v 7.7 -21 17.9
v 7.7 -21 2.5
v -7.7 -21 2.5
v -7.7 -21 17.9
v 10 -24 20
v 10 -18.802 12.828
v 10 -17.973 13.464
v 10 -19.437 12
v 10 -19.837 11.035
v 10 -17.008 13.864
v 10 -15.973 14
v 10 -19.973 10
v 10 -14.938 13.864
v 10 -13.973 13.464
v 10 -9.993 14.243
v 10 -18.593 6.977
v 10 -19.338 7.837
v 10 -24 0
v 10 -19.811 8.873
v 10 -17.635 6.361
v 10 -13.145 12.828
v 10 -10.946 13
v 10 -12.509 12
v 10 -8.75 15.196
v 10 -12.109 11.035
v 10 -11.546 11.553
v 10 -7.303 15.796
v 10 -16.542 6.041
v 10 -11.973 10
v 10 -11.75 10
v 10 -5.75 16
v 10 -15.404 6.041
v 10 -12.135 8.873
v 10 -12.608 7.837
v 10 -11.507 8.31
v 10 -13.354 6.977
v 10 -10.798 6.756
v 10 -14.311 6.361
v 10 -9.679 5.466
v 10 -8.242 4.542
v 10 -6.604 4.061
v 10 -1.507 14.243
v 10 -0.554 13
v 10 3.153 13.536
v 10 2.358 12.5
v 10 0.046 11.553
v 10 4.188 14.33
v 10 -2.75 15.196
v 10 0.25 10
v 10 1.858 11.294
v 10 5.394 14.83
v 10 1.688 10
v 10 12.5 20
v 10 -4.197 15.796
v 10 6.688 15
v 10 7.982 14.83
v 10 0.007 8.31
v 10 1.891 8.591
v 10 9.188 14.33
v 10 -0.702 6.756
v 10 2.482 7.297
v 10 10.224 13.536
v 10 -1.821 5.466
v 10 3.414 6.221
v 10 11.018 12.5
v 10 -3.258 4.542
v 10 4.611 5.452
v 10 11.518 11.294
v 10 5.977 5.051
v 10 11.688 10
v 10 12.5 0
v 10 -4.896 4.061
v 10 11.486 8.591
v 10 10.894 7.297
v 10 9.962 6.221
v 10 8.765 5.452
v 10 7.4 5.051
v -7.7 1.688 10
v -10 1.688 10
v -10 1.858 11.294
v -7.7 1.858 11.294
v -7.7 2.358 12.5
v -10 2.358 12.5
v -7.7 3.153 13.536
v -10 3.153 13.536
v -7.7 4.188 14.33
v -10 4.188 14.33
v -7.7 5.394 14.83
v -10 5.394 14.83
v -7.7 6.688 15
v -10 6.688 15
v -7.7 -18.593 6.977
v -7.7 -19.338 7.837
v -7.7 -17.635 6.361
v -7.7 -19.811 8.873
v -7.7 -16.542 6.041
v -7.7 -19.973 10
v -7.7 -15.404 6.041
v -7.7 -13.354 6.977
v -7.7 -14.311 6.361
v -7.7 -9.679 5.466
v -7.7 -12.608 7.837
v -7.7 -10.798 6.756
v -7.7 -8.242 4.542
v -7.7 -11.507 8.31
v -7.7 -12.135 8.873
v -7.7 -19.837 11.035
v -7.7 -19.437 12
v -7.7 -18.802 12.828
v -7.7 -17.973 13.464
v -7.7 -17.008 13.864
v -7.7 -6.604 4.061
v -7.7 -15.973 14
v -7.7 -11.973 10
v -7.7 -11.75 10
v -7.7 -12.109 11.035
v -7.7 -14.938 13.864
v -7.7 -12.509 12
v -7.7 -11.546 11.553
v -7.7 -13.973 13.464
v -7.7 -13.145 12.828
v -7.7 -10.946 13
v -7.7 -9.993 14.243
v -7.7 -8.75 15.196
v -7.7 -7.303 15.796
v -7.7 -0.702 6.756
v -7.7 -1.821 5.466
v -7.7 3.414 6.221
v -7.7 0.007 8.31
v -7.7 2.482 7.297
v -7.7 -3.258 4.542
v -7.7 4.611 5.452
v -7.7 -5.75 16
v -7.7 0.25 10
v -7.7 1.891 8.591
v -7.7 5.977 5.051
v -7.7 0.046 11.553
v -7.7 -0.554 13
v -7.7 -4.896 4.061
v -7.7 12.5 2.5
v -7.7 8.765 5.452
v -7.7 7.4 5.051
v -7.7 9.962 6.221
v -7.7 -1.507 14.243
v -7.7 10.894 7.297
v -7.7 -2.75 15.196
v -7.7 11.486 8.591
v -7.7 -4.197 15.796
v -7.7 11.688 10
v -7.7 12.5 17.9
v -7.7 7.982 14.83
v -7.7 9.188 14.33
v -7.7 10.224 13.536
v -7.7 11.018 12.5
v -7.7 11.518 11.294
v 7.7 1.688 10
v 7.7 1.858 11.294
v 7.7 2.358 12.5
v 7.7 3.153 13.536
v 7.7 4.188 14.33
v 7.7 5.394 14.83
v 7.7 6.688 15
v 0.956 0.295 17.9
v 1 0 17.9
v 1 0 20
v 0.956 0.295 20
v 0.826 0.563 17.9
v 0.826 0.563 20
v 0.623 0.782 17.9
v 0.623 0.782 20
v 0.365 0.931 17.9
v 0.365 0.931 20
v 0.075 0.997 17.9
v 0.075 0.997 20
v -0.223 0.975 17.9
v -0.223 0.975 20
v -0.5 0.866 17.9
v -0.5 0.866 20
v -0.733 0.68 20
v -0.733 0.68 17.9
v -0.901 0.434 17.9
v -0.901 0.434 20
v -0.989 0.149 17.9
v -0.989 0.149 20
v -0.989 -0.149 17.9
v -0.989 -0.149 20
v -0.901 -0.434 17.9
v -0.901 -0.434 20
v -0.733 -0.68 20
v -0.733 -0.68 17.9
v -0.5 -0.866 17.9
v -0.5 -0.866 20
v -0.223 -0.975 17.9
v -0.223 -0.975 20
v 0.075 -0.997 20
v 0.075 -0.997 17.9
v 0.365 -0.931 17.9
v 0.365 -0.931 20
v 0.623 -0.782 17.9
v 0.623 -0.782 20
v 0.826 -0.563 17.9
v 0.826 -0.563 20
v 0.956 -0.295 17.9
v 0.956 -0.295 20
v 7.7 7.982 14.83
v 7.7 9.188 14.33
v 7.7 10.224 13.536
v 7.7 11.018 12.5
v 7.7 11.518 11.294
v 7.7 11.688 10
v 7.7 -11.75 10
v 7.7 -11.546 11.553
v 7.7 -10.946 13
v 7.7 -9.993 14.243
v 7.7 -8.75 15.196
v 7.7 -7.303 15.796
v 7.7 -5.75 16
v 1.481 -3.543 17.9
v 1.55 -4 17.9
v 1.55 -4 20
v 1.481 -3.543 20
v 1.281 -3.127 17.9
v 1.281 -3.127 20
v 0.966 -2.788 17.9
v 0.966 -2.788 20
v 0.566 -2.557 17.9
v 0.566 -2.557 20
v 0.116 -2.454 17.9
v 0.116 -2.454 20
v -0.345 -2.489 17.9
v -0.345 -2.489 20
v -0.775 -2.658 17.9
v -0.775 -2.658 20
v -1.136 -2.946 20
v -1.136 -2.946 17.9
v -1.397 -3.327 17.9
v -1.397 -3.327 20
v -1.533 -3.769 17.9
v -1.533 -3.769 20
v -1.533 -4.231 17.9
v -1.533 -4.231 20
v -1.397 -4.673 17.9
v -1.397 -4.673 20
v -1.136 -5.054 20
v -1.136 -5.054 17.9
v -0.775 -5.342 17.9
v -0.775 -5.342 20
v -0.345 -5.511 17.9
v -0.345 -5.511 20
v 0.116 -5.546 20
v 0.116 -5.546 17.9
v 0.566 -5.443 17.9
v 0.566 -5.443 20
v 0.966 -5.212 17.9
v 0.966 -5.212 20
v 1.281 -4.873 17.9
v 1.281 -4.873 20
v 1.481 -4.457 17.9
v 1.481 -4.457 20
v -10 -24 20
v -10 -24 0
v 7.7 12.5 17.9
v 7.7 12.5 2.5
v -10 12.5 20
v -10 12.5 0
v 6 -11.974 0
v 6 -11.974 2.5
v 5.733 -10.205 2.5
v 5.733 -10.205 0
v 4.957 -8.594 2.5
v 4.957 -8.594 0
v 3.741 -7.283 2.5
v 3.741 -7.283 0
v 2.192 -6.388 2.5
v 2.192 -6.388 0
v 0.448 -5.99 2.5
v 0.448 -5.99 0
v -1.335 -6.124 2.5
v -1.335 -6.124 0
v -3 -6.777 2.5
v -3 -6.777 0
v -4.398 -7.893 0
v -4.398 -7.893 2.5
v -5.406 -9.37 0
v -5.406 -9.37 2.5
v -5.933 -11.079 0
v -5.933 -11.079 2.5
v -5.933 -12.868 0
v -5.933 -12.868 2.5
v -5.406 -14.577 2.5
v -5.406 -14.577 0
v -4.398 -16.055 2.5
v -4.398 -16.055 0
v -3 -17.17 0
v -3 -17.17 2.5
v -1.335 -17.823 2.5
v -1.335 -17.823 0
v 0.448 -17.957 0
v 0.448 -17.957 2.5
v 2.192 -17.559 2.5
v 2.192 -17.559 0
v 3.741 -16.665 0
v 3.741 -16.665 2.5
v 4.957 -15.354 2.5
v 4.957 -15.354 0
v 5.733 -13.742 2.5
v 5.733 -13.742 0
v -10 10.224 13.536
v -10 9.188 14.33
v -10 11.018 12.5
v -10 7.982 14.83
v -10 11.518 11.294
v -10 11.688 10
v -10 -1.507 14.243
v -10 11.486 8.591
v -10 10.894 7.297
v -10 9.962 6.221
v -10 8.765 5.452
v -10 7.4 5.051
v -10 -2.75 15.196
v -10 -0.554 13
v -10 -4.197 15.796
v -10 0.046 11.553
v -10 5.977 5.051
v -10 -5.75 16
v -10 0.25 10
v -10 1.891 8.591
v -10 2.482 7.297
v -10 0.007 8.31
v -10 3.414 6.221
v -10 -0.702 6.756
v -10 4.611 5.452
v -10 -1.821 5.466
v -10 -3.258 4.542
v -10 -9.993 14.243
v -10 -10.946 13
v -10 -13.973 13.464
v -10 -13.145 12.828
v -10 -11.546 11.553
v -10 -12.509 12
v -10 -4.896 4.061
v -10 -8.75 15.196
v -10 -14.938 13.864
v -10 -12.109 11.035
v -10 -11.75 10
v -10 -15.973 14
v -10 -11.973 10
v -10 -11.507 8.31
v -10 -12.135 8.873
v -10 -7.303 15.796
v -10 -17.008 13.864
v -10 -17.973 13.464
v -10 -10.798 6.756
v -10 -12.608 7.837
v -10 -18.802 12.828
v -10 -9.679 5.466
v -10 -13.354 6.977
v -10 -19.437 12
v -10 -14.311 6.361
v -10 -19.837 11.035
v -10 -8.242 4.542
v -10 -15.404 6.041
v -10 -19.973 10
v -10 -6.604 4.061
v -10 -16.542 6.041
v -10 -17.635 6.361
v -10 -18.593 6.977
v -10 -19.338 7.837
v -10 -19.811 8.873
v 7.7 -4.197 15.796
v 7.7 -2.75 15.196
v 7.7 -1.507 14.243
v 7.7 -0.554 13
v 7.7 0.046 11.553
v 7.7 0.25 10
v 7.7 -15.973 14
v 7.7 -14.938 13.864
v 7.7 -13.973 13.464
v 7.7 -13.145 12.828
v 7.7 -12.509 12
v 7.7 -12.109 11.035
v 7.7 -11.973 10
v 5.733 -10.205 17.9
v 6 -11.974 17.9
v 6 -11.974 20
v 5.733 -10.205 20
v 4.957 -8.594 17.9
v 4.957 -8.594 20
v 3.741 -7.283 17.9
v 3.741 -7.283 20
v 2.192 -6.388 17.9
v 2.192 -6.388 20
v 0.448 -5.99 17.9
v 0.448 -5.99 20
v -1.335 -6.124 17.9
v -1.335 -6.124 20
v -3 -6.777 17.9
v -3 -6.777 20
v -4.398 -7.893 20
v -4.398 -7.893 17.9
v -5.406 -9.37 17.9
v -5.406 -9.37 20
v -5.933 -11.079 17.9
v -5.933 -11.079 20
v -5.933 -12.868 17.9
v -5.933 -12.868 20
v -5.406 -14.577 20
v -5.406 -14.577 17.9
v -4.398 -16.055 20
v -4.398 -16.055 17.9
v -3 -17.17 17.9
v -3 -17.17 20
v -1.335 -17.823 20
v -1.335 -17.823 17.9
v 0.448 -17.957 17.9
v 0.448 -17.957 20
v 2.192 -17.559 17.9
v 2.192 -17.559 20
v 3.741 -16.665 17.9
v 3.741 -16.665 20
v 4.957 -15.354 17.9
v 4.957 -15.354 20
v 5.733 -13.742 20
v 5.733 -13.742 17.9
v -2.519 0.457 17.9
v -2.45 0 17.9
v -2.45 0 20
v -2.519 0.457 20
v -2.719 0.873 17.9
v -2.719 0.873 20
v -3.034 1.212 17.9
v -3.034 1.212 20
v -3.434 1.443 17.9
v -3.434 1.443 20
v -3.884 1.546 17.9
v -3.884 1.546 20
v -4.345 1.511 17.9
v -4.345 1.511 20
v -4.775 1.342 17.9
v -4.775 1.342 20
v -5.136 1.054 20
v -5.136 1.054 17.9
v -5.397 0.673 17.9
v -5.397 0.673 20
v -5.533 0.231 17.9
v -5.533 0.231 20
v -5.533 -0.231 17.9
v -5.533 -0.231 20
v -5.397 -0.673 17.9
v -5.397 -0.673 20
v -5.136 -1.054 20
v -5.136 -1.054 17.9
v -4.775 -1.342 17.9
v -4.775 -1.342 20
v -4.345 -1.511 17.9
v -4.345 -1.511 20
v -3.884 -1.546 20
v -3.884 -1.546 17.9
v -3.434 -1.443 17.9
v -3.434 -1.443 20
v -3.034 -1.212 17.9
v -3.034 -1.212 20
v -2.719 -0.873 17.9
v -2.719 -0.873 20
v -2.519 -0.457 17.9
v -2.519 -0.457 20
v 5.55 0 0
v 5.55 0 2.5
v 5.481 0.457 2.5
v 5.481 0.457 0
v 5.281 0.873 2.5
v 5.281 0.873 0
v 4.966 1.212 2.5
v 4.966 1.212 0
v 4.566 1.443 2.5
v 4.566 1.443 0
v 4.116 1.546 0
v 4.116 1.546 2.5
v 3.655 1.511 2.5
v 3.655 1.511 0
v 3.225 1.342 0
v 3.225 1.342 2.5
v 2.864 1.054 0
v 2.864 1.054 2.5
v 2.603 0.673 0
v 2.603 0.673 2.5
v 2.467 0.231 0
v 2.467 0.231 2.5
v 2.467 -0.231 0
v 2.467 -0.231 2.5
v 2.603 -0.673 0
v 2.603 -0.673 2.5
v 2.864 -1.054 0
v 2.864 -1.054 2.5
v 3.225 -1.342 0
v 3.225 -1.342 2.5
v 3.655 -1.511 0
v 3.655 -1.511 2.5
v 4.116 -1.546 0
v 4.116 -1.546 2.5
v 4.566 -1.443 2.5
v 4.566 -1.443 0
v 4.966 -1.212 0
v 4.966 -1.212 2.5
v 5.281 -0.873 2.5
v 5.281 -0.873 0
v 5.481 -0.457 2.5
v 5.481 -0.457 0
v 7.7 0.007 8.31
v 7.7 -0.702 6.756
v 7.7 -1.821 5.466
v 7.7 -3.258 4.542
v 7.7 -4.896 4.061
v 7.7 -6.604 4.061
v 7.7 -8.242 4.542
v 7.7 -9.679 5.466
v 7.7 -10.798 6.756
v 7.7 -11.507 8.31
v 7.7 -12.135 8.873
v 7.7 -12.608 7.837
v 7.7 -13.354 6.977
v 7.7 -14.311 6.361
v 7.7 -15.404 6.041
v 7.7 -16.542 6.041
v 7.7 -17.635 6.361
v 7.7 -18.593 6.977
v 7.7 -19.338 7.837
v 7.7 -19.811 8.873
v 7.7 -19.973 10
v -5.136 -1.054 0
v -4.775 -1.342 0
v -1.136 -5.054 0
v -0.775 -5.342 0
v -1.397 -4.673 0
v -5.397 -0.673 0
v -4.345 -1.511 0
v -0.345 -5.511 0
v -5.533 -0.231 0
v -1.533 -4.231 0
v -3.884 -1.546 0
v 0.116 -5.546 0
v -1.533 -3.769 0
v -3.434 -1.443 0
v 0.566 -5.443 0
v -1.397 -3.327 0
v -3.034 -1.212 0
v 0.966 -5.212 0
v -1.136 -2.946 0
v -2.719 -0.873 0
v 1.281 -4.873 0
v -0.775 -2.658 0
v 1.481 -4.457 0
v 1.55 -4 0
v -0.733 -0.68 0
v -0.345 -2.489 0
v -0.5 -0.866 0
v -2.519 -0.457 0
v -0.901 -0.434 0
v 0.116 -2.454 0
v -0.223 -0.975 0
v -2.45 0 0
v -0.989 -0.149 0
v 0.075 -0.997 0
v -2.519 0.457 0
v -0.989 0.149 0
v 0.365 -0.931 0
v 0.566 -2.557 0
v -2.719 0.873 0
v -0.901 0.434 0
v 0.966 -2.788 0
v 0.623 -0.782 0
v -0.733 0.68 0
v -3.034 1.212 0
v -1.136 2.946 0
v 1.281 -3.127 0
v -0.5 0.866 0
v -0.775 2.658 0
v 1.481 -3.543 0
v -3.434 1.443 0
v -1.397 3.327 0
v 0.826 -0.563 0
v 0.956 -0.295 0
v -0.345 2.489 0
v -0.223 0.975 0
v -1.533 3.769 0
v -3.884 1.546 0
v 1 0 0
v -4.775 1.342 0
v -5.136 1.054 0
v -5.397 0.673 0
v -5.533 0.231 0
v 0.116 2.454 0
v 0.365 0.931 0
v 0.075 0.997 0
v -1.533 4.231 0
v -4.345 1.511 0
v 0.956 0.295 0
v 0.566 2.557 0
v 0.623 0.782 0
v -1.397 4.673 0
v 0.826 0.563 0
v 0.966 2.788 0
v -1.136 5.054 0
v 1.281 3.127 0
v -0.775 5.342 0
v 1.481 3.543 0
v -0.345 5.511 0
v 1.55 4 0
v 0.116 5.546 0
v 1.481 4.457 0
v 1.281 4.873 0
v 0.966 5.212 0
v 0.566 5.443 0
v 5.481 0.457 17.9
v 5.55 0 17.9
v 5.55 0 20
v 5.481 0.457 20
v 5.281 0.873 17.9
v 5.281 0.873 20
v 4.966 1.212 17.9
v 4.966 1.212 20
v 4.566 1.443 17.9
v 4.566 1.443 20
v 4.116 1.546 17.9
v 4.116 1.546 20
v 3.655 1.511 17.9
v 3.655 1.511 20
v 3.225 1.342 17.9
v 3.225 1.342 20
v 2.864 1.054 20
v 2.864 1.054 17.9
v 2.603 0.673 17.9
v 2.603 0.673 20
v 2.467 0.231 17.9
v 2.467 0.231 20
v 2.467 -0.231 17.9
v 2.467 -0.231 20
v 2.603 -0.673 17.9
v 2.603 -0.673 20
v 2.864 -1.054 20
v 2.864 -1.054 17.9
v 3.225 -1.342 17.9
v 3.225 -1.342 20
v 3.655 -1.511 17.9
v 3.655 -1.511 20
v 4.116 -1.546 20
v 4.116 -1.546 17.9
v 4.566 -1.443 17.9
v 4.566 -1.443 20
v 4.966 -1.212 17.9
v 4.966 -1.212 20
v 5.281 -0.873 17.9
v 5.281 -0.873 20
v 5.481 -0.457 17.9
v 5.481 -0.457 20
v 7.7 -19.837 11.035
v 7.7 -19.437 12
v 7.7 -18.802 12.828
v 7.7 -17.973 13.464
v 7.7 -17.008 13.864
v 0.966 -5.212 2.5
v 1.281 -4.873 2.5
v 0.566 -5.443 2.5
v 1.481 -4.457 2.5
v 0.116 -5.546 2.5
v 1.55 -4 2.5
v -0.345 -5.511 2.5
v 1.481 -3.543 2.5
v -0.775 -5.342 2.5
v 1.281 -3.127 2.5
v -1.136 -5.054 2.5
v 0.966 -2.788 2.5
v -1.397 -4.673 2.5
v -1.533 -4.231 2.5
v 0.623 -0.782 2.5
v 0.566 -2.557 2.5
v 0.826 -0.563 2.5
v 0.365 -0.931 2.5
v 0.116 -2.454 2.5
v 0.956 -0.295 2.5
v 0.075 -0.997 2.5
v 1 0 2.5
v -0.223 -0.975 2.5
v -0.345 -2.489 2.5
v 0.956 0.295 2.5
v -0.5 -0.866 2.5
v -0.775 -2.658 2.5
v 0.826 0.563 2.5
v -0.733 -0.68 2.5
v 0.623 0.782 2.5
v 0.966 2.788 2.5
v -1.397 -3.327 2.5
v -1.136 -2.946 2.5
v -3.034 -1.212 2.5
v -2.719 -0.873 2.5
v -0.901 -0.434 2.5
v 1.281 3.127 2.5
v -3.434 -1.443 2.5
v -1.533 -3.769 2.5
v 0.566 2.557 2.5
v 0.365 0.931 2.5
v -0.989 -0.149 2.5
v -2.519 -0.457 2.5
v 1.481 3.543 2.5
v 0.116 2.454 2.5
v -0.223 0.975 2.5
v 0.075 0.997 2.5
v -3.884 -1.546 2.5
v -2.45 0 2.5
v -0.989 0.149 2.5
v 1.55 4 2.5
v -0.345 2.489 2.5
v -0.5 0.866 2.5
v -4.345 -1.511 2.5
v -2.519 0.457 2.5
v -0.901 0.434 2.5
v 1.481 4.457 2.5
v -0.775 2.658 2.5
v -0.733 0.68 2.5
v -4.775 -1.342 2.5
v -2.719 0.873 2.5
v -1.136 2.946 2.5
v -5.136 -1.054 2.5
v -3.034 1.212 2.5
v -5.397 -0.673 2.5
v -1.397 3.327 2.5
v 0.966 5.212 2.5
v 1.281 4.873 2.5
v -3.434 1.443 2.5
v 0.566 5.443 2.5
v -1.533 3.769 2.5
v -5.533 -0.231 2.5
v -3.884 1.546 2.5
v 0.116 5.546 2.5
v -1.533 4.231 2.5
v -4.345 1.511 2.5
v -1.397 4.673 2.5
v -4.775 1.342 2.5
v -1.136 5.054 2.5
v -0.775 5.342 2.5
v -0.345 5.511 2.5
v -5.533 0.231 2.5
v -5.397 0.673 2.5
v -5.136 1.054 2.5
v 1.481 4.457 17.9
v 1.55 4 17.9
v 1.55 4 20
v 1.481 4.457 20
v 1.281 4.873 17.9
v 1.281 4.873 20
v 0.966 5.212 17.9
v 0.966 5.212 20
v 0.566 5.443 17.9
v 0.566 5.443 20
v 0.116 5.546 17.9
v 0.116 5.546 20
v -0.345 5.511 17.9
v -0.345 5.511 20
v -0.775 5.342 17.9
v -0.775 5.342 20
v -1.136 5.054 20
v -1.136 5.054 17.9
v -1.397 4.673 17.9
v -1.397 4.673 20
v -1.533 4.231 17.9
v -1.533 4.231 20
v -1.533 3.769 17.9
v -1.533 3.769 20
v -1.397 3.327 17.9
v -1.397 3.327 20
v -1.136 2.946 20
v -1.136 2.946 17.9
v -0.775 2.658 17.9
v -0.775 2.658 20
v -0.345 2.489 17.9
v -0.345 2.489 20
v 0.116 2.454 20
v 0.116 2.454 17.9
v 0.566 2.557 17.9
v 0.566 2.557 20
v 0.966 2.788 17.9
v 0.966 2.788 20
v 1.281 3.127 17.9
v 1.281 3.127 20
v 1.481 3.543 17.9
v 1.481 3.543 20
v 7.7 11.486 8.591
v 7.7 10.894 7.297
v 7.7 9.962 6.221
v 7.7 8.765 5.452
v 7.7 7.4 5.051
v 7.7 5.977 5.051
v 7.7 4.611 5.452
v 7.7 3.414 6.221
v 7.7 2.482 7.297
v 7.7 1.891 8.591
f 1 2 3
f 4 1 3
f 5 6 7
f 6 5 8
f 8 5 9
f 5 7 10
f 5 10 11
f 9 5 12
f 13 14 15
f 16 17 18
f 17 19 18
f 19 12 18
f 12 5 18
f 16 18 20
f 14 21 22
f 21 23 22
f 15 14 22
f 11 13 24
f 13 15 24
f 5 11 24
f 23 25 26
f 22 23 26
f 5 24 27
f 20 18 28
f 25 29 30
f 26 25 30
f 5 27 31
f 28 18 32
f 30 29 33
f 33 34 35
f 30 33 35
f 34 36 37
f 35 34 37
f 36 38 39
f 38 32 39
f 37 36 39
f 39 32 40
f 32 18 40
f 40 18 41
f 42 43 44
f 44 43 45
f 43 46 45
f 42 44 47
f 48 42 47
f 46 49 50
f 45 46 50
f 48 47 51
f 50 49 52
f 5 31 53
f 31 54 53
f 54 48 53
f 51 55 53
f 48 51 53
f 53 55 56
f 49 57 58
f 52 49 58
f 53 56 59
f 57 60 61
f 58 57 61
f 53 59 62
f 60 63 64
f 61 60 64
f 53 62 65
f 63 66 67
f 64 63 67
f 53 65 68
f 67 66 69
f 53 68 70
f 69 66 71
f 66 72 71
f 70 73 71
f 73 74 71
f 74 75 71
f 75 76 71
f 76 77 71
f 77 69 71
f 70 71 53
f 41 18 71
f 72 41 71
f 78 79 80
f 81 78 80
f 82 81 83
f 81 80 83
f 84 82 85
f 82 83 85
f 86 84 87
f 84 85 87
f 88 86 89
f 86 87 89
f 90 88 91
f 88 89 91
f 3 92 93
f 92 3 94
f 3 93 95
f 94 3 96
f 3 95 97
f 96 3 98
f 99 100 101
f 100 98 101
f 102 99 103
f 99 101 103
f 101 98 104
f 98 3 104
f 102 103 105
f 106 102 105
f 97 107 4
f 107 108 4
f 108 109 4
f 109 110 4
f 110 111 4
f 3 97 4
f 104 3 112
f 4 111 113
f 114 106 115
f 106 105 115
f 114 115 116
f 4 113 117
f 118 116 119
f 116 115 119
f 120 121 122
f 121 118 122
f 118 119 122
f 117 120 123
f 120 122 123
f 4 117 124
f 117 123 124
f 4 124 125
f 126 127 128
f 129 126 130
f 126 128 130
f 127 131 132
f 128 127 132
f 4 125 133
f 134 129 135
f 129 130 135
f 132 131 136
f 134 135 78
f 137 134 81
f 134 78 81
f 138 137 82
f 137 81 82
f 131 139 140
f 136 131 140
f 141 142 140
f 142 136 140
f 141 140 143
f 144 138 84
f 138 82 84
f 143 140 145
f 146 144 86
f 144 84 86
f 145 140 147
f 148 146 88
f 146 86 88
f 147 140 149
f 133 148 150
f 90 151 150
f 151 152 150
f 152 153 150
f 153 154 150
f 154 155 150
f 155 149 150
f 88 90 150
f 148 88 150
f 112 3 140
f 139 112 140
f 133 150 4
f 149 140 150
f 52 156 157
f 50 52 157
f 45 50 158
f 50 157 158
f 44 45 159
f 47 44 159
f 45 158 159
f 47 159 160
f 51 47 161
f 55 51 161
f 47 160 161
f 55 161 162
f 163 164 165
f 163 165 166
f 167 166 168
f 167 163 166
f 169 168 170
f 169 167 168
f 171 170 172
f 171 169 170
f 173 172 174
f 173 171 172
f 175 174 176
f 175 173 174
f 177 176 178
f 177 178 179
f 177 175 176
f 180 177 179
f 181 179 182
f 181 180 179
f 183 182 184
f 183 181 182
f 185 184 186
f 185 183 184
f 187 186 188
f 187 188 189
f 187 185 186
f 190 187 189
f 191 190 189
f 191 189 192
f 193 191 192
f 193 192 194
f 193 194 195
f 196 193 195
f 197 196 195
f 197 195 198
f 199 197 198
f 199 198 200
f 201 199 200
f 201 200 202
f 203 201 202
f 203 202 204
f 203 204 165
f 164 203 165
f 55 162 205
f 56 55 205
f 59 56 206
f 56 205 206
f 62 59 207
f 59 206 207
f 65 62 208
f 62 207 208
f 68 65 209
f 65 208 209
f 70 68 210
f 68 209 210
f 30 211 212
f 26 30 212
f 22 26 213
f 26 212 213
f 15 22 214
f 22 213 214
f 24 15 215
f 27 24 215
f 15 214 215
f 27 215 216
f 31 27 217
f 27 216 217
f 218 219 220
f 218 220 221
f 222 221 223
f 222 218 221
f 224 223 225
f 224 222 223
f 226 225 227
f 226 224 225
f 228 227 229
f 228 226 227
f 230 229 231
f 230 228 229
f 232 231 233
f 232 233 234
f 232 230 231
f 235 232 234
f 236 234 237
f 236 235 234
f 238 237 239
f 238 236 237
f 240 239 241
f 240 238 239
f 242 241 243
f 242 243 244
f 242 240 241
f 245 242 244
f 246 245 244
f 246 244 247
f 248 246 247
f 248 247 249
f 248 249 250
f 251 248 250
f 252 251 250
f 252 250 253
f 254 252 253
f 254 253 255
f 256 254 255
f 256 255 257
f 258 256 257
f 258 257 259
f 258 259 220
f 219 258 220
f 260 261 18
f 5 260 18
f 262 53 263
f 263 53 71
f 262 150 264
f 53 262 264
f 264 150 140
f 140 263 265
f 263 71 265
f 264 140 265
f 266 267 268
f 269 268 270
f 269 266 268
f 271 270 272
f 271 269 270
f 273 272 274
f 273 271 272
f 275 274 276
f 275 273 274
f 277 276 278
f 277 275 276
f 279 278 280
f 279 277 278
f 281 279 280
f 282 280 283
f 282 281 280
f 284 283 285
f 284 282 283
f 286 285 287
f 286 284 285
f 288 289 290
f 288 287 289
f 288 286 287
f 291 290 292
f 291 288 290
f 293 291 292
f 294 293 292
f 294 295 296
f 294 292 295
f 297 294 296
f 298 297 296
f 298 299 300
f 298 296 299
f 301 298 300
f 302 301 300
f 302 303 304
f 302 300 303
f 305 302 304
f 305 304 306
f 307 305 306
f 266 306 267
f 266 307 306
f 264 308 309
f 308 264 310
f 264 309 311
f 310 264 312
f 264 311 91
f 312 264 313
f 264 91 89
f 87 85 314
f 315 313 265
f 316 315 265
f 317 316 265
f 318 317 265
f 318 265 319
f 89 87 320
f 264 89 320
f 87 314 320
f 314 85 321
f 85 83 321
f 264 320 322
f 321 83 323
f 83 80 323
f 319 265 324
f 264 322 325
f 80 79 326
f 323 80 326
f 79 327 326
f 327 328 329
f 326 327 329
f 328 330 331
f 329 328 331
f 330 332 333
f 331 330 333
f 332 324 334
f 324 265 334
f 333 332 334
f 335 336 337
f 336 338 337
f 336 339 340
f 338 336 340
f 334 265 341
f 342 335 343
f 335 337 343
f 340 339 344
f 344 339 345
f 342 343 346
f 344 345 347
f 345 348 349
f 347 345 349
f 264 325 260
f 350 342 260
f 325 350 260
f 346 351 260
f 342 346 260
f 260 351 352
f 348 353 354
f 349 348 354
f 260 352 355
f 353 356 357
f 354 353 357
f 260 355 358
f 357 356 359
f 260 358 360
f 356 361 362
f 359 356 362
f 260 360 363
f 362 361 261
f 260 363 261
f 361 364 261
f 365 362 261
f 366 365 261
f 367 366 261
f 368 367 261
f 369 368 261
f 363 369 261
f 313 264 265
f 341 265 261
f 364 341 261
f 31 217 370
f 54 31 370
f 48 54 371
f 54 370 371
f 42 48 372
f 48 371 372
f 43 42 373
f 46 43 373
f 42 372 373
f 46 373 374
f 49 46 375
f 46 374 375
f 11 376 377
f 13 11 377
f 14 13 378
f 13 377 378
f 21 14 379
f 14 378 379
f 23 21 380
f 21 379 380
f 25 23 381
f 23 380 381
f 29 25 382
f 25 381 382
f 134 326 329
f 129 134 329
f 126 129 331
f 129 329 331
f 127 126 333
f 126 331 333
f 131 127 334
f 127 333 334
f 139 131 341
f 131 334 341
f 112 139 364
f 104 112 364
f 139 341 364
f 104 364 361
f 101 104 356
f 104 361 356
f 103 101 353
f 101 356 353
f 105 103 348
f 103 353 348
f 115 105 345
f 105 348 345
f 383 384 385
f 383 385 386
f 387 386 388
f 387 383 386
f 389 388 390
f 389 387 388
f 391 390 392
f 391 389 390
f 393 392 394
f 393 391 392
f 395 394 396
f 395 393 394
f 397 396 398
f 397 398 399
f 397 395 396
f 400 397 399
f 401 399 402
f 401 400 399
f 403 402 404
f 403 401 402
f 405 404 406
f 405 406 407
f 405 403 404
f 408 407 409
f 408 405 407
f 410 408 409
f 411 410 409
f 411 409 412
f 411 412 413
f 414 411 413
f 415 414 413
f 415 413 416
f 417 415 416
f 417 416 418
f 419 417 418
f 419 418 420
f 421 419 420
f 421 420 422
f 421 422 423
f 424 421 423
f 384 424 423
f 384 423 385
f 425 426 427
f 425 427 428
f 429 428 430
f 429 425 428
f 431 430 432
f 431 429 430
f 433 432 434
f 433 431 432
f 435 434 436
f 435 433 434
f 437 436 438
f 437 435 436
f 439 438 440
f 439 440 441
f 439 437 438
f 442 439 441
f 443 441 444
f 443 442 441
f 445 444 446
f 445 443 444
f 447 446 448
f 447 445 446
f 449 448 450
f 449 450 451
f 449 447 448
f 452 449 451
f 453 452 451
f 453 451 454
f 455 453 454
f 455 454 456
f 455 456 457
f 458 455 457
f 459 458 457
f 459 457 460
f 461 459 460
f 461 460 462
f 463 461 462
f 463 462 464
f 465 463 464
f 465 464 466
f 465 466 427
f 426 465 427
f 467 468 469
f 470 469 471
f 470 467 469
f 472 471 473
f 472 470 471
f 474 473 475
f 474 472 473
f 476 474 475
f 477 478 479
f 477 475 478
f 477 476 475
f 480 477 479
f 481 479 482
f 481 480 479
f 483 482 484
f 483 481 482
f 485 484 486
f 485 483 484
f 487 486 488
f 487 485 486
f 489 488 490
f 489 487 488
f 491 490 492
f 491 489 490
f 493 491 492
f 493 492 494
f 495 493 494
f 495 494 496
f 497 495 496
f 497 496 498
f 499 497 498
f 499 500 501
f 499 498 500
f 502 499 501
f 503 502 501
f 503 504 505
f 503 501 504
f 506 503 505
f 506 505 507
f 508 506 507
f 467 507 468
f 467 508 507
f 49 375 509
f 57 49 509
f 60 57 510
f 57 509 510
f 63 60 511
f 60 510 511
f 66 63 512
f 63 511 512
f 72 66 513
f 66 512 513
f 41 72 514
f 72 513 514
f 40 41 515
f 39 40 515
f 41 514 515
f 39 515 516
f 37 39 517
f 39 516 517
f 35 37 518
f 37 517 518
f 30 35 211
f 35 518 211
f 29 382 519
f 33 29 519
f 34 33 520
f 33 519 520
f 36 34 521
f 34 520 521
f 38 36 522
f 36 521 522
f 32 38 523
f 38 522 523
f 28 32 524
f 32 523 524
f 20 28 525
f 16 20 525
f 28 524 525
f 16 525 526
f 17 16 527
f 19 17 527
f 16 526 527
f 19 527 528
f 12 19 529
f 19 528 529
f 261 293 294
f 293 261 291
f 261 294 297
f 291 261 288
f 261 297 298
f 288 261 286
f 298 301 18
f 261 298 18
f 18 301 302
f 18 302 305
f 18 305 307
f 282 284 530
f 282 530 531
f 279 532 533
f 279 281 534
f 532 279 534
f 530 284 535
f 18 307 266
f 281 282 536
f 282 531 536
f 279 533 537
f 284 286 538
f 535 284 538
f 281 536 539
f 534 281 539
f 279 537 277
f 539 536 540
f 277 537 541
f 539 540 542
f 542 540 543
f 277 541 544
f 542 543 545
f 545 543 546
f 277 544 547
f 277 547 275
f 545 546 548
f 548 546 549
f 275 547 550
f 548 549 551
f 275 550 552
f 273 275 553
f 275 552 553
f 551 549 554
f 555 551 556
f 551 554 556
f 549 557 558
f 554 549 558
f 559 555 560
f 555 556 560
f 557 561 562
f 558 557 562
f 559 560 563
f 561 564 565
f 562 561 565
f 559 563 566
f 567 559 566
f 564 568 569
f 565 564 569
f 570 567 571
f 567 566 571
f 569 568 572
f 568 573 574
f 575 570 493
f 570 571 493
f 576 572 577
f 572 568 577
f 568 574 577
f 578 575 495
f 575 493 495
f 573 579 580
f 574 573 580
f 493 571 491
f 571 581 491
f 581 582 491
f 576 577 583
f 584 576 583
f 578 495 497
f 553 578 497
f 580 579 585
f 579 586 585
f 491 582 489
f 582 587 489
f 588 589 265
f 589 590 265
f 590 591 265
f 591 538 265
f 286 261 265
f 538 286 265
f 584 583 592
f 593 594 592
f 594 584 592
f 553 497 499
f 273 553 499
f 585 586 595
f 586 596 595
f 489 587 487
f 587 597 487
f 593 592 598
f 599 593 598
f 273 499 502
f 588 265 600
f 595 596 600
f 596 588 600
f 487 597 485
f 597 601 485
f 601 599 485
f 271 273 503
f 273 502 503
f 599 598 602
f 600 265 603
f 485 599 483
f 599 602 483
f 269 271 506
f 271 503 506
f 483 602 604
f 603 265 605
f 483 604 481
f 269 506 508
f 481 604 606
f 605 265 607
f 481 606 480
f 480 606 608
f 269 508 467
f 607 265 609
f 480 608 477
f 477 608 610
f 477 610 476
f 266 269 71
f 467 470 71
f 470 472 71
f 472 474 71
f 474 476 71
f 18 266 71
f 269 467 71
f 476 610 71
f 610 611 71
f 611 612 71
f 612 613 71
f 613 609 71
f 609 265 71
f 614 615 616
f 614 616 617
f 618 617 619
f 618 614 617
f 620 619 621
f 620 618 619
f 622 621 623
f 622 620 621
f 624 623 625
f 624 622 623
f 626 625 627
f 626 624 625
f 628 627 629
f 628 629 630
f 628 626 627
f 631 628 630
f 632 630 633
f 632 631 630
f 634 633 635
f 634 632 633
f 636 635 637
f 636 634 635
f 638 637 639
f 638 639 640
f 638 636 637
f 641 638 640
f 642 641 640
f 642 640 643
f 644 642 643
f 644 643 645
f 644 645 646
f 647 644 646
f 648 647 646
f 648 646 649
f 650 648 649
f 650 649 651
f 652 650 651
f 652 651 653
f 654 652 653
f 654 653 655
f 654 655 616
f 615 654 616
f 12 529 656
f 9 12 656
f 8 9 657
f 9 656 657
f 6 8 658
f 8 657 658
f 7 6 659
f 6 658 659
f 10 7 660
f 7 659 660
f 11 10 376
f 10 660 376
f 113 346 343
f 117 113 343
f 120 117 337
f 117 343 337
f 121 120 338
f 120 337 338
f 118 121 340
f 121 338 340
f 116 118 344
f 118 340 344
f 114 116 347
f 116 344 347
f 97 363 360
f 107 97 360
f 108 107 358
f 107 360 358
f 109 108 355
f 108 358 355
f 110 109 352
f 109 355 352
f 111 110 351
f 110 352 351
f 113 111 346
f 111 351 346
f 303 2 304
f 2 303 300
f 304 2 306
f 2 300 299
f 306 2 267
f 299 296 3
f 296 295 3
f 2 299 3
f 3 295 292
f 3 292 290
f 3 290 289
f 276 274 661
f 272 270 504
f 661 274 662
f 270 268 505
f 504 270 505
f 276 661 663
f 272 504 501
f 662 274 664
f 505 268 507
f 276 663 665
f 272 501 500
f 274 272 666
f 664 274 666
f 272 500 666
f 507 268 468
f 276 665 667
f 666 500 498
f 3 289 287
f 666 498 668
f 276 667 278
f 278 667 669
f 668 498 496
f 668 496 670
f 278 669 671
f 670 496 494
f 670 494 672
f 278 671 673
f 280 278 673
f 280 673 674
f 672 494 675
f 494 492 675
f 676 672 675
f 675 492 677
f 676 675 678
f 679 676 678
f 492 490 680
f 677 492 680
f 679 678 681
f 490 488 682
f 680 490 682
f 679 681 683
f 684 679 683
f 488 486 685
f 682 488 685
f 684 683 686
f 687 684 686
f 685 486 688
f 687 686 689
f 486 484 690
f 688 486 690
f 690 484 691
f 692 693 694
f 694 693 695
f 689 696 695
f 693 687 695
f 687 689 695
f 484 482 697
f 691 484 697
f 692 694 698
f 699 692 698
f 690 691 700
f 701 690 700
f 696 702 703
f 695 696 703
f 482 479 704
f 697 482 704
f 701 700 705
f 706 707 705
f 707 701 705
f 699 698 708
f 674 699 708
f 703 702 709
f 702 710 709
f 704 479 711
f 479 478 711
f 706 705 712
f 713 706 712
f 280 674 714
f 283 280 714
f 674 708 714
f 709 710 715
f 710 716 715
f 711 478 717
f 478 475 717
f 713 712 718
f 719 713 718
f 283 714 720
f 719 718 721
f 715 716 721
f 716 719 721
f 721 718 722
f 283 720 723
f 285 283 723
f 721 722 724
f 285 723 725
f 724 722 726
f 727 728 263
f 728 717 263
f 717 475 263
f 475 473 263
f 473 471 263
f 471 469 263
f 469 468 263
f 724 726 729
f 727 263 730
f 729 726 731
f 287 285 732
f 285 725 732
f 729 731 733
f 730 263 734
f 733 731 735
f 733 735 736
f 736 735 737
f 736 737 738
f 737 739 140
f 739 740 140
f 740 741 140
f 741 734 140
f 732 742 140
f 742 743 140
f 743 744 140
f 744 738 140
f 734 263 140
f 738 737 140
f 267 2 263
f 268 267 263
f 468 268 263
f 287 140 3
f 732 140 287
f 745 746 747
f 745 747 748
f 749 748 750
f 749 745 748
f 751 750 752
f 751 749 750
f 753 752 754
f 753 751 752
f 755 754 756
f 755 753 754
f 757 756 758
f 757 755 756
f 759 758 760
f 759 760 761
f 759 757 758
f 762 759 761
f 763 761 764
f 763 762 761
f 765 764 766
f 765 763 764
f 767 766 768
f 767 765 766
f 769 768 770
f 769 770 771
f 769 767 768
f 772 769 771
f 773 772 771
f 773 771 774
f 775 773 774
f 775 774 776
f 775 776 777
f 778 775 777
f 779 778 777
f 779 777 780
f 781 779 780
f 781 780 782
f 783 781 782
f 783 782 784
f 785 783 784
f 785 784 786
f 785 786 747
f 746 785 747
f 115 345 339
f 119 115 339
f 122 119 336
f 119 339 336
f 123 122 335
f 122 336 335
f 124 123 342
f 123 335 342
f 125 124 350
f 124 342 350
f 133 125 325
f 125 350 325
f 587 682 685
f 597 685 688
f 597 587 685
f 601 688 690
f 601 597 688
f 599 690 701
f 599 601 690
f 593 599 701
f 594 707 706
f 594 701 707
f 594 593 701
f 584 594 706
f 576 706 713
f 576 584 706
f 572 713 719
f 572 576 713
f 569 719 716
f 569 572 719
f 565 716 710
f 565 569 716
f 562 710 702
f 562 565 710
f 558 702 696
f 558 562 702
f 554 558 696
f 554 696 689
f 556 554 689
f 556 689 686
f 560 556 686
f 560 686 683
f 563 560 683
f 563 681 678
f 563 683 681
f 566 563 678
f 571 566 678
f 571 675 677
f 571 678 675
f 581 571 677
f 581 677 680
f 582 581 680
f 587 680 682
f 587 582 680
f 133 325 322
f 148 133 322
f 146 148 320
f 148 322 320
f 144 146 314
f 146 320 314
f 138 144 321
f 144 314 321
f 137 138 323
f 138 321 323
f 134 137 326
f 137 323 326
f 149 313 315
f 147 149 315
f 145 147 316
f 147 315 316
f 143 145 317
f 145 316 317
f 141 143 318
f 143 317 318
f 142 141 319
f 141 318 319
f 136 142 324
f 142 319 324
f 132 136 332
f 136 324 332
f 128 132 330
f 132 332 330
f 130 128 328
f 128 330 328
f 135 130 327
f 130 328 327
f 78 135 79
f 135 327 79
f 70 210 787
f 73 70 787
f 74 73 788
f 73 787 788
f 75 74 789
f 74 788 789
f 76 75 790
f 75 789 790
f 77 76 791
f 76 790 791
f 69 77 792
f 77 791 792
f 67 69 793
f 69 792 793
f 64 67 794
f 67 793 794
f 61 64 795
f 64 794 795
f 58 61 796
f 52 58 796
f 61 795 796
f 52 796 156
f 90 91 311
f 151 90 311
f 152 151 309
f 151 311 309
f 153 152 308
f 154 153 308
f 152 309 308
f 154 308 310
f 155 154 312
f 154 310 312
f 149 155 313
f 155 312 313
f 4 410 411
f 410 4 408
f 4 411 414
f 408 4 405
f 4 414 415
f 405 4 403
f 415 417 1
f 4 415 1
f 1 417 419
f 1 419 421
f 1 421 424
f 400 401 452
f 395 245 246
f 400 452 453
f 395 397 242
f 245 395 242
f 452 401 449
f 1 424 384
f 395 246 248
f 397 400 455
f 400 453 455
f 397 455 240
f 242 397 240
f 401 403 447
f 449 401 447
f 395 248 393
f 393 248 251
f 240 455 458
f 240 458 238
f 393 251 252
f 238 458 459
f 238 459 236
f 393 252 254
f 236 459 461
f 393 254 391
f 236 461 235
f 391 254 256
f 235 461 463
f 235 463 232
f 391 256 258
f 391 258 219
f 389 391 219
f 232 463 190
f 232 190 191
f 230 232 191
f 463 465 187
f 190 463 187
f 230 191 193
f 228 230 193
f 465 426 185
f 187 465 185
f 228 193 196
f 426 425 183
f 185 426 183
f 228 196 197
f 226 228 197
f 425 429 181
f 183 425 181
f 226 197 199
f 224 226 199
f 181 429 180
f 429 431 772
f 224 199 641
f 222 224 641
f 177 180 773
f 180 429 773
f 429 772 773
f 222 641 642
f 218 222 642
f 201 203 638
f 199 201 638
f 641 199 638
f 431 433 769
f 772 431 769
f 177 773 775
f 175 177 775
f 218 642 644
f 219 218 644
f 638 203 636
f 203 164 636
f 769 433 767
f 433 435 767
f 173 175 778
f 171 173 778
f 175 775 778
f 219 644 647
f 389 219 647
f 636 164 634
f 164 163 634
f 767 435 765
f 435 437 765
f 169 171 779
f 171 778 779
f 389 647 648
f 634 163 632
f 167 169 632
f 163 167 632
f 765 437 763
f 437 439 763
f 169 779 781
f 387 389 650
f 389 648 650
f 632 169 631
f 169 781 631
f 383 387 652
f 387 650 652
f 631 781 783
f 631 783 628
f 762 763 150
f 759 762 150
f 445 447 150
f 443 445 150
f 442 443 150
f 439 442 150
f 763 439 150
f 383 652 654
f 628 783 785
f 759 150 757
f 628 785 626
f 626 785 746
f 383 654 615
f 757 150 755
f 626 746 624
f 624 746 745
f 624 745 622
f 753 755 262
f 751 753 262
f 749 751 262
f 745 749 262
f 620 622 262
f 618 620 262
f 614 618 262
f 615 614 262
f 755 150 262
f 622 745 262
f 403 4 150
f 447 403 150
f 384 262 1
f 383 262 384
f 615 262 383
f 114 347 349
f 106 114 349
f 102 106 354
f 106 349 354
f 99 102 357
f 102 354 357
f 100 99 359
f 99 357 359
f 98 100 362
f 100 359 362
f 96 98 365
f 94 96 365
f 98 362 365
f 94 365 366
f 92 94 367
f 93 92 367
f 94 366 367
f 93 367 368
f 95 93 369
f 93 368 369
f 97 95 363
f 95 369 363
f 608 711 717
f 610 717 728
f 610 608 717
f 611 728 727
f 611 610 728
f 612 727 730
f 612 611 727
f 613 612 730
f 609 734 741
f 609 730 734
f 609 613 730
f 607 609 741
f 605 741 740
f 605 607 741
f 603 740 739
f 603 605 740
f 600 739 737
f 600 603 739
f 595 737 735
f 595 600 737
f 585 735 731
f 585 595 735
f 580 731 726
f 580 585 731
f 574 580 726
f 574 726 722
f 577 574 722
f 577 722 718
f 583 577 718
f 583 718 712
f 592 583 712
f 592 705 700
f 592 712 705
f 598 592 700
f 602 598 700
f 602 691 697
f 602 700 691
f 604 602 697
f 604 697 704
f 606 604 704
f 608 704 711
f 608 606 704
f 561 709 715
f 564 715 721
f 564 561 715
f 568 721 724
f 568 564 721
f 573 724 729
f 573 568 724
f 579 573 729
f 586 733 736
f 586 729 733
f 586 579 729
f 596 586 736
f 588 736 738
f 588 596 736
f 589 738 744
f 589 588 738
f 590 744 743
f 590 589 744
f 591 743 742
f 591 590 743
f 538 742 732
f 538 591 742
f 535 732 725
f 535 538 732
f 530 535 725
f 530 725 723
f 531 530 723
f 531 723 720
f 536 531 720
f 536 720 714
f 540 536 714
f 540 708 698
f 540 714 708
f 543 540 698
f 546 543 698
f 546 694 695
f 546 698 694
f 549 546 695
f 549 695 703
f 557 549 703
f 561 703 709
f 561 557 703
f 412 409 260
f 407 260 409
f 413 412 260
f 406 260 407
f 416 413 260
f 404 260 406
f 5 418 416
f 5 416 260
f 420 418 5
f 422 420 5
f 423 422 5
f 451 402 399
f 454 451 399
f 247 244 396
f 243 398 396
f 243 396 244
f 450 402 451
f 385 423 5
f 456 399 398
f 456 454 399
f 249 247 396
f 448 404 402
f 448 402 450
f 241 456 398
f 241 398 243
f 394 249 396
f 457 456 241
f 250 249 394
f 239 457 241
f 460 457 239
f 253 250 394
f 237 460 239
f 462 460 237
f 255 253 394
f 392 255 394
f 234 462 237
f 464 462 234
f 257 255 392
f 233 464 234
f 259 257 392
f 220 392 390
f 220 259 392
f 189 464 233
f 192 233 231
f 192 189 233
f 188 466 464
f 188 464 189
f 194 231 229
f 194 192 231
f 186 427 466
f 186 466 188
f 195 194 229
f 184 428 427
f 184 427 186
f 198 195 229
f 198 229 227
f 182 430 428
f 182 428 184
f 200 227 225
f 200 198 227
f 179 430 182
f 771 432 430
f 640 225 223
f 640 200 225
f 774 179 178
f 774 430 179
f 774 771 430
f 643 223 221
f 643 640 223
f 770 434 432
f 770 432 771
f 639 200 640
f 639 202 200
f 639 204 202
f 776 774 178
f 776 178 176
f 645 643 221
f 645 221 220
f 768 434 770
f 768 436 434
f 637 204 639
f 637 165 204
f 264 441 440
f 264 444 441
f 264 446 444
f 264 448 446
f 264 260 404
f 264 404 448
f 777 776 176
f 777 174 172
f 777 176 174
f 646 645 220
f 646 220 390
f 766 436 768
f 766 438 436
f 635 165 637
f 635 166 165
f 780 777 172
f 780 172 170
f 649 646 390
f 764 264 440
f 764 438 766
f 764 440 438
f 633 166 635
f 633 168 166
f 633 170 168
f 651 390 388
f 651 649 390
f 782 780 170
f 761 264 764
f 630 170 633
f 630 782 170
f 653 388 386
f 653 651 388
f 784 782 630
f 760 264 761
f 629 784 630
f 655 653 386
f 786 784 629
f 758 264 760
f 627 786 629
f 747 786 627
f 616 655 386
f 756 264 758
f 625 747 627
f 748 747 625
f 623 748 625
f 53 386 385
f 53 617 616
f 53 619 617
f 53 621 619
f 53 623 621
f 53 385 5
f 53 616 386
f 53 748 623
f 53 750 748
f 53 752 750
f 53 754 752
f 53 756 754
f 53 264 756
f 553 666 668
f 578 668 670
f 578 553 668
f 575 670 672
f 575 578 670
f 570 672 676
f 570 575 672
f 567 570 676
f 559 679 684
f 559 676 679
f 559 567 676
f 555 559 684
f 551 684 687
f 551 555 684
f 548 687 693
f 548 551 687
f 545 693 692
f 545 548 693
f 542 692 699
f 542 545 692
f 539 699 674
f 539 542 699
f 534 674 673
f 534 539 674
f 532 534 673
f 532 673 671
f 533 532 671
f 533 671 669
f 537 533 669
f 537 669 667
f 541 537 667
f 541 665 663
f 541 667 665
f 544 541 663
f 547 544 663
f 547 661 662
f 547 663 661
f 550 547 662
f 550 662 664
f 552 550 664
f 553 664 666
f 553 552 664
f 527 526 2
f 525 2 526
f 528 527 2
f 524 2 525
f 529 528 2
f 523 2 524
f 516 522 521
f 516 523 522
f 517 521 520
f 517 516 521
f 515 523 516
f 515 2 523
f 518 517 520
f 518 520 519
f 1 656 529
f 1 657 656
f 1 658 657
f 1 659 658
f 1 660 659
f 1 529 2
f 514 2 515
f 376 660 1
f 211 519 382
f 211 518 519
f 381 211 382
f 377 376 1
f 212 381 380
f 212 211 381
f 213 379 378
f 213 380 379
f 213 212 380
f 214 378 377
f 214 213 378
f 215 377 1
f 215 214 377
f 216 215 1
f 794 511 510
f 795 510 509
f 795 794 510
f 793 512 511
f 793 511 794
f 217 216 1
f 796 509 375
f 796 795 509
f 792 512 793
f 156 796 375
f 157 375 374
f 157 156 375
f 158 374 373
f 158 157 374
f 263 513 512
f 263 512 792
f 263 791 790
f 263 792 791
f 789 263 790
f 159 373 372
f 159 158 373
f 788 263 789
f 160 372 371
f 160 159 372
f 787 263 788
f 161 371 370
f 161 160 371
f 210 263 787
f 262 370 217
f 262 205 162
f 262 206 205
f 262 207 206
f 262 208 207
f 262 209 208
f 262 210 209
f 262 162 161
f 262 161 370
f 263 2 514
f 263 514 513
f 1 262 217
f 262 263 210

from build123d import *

# Parameters (mm, degrees)
SKETCH_1_R          = 1
SKETCH_1_R_2        = 1.55
SKETCH_1_R_3        = 6
EXTRUDE_1_DEPTH     = 20
CUT_EXTRUDE_1_DEPTH = 33.5
CUT_EXTRUDE_2_DEPTH = 21


with BuildPart() as part:
    # 草图1 → 凸台-拉伸1 (new body)
    with BuildSketch(Plane.XY):
        Polygon((10, 0), (10, 12.5), (0, 12.5), (-10, 12.5), (-10, -24), (10, -24), align=None)
        Circle(SKETCH_1_R, mode=Mode.SUBTRACT)
        with Locations((0, 4)):
            Circle(SKETCH_1_R_2, mode=Mode.SUBTRACT)
        with Locations((4, 0)):
            Circle(SKETCH_1_R_2, mode=Mode.SUBTRACT)
        with Locations((0, -4)):
            Circle(SKETCH_1_R_2, mode=Mode.SUBTRACT)
        with Locations((-4, 0)):
            Circle(SKETCH_1_R_2, mode=Mode.SUBTRACT)
        with Locations((0, -11.97364961)):
            Circle(SKETCH_1_R_3, mode=Mode.SUBTRACT)
    extrude(amount=EXTRUDE_1_DEPTH)

    # 草图2 → 切除-拉伸1 (cut)
    with BuildSketch(Plane(origin=(0, 12.5, 0), x_dir=(1, 0, 0), z_dir=(0, 1, 0))):
        Polygon((-7.7, -10.2), (-7.7, -2.5), (0, -2.5), (7.7, -2.5), (7.7, -17.9), (0, -17.9), (-7.7, -17.9), align=None)
    extrude(amount=-CUT_EXTRUDE_1_DEPTH, mode=Mode.SUBTRACT)

    # 草图3 → 切除-拉伸2 (cut, through all)
    with BuildSketch(Plane.ZY.offset(10)):
        with BuildLine():
            ThreePointArc((16, -5.75), (14.242640687, -1.507359313), (10, 0.25))
            Line((10, 0.25), (10, -11.75))
            ThreePointArc((10, -11.75), (14.242640687, -9.992640687), (16, -5.75))
        make_face()
        with BuildLine():
            Line((10, -11.75), (10, 0.25))
            ThreePointArc((10, 0.25), (4, -5.75), (10, -11.75))
        make_face()
        with BuildLine():
            ThreePointArc((15, 6.688097559), (13.535533906, 10.223631465), (10, 11.688097559))
            Line((10, 11.688097559), (10, 1.688097559))
            ThreePointArc((10, 1.688097559), (13.535533906, 3.152563653), (15, 6.688097559))
        make_face()
        with BuildLine():
            Line((10, 1.688097559), (10, 11.688097559))
            ThreePointArc((10, 11.688097559), (5, 6.688097559), (10, 1.688097559))
        make_face()
        with BuildLine():
            ThreePointArc((14, -15.973088327), (12.828427125, -13.144661202), (10, -11.973088327))
            Line((10, -11.973088327), (10, -19.973088327))
            ThreePointArc((10, -19.973088327), (12.828427125, -18.801515451), (14, -15.973088327))
        make_face()
        with BuildLine():
            Line((10, -19.973088327), (10, -11.973088327))
            ThreePointArc((10, -11.973088327), (6, -15.973088327), (10, -19.973088327))
        make_face()
    extrude(amount=-CUT_EXTRUDE_2_DEPTH, mode=Mode.SUBTRACT)


solid = part.part
